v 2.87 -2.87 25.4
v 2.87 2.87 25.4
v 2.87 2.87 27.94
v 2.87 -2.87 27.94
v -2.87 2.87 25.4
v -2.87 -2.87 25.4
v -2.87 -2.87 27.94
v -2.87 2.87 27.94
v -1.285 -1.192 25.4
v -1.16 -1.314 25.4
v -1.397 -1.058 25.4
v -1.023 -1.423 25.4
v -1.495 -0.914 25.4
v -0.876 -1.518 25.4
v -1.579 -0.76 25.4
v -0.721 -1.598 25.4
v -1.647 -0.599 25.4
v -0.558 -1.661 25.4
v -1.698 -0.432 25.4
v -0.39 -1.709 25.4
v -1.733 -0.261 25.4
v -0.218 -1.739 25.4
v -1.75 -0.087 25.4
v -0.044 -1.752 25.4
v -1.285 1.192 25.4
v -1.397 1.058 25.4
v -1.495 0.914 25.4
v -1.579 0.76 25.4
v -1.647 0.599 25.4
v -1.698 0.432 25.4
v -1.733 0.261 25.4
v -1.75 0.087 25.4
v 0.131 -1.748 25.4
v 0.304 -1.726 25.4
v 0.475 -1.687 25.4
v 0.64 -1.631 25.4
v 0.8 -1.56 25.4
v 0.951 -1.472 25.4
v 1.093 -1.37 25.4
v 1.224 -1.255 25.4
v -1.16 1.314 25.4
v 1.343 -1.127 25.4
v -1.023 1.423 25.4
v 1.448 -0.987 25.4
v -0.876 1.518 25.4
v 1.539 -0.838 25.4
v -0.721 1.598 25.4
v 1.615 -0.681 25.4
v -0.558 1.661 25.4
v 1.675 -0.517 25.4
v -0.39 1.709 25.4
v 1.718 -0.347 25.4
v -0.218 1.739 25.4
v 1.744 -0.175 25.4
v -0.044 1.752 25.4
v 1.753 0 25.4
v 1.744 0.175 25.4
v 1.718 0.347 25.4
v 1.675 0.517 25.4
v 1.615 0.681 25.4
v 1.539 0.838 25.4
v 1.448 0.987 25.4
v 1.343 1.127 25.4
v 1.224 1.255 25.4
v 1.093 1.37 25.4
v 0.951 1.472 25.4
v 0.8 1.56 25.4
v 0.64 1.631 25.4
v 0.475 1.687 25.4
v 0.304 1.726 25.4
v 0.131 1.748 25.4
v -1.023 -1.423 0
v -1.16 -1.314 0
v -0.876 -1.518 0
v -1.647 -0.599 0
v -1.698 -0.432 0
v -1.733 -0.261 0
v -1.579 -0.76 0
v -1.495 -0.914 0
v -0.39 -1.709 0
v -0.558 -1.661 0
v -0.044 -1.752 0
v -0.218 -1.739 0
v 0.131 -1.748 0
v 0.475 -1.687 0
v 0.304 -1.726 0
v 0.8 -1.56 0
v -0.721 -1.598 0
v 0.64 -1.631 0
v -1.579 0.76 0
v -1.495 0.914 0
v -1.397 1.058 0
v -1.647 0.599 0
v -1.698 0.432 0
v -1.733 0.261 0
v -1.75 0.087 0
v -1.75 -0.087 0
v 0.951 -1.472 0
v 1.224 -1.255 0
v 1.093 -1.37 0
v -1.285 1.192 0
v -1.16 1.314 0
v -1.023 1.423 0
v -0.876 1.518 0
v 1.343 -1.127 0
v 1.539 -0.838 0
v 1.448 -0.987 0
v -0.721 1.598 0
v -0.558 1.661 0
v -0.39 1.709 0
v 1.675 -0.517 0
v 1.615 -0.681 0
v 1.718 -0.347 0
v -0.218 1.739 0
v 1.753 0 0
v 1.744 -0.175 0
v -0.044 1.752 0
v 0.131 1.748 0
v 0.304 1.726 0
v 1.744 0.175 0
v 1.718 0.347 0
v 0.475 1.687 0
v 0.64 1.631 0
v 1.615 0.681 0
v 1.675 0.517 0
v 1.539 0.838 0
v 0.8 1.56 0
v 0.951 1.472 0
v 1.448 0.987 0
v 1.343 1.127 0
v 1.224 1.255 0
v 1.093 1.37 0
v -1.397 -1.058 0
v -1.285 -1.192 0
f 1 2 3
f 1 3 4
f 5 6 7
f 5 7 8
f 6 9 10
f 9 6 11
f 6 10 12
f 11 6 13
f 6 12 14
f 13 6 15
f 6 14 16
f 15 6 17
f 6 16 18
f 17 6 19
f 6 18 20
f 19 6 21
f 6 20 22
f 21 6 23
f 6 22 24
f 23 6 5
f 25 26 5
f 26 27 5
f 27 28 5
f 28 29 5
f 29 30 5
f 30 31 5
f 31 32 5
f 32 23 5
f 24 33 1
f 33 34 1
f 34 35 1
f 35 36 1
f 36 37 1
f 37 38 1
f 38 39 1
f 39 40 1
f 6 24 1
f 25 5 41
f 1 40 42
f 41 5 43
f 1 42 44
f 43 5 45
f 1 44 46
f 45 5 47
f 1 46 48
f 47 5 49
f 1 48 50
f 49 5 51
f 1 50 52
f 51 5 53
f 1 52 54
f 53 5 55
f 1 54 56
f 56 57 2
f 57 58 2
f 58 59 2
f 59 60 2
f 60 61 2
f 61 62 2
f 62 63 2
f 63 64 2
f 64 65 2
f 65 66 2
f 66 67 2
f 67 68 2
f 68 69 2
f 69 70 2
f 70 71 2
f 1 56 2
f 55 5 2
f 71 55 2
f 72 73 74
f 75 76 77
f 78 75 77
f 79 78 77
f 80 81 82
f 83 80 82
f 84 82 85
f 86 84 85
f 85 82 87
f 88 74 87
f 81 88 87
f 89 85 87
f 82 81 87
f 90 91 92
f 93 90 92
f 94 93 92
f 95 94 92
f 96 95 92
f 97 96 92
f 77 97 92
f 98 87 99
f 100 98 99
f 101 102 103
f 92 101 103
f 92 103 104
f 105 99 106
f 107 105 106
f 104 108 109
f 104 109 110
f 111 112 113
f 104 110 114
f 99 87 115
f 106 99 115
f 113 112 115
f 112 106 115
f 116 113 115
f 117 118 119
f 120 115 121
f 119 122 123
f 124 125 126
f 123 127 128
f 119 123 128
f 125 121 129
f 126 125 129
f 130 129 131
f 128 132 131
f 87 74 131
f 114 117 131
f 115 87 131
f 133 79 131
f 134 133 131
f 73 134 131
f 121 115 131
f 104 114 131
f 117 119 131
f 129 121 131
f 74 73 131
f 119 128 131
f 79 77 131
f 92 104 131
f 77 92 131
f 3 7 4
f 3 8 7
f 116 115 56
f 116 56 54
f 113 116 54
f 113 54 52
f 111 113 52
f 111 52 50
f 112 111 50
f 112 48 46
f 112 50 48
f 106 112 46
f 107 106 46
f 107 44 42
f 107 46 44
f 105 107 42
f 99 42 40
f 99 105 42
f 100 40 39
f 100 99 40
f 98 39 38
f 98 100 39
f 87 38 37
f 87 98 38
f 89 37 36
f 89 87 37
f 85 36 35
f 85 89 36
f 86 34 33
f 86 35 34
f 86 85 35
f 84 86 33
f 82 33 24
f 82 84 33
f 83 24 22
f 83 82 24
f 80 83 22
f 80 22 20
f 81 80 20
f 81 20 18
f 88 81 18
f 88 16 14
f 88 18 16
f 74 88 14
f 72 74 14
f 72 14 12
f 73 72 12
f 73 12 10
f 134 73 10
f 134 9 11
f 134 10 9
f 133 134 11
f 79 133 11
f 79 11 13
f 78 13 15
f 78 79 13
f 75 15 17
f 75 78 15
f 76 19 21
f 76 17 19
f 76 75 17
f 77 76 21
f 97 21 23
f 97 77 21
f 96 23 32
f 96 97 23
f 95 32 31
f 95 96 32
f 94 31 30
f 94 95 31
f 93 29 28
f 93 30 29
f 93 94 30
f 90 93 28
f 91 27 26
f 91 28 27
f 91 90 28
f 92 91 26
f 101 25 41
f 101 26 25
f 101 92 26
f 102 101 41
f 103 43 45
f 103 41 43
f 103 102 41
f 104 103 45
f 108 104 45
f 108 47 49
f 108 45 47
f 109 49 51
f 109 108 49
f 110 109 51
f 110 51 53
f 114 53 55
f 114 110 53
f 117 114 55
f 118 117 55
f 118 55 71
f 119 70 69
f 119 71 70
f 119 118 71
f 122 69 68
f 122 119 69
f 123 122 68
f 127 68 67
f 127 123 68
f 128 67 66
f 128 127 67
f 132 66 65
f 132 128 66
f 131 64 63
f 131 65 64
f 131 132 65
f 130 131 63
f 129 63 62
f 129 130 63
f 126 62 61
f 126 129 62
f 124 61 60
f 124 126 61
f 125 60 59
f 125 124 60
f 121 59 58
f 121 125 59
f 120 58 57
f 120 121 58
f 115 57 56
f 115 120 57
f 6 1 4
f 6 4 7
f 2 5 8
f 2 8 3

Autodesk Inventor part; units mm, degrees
ref_plane "YZ Plane" through (0, 0, 0) normal (1, 0, 0) x (0, 1, 0)
ref_plane "XZ Plane" through (0, 0, 0) normal (0, 1, 0) x (-1, 0, 0)
ref_plane "XY Plane" through (0, 0, 0) normal (0, 0, 1) x (1, 0, 0)
sketch "Sketch1" plane through (0, 0, 0) normal (0, 0, 1) x (1, 0, 0)
  circle A0 centre (0, 0) radius 1.7526
  dimension "d0" = 3.5052
extrude "Extrusion1" add sketch "Sketch1" along normal blind 25.4
sketch "Sketch2" plane through (0, 0, 25.4) normal (0, 0, 1) x (1, 0, 0)
  line L0 (-2.8702, 2.8702) -> (2.8702, 2.8702)
  line L1 (2.8702, 2.8702) -> (2.8702, -2.8702)
  line L2 (2.8702, -2.8702) -> (-2.8702, -2.8702)
  line L3 (-2.8702, -2.8702) -> (-2.8702, 2.8702)
  point P0 (0, 0)
  dimension "d3" = 5.7404
  dimension "d4" = 5.7404
  dimension "d5" = 2.8702
  dimension "d6" = 2.8702
  dimension "d7" = 2.8702
extrude "Extrusion2" add sketch "Sketch2" along normal blind 2.54
thread "Thread1" size "6-32 UNC" class "2A" standard "ANSI Unified Screw Threads" full length
